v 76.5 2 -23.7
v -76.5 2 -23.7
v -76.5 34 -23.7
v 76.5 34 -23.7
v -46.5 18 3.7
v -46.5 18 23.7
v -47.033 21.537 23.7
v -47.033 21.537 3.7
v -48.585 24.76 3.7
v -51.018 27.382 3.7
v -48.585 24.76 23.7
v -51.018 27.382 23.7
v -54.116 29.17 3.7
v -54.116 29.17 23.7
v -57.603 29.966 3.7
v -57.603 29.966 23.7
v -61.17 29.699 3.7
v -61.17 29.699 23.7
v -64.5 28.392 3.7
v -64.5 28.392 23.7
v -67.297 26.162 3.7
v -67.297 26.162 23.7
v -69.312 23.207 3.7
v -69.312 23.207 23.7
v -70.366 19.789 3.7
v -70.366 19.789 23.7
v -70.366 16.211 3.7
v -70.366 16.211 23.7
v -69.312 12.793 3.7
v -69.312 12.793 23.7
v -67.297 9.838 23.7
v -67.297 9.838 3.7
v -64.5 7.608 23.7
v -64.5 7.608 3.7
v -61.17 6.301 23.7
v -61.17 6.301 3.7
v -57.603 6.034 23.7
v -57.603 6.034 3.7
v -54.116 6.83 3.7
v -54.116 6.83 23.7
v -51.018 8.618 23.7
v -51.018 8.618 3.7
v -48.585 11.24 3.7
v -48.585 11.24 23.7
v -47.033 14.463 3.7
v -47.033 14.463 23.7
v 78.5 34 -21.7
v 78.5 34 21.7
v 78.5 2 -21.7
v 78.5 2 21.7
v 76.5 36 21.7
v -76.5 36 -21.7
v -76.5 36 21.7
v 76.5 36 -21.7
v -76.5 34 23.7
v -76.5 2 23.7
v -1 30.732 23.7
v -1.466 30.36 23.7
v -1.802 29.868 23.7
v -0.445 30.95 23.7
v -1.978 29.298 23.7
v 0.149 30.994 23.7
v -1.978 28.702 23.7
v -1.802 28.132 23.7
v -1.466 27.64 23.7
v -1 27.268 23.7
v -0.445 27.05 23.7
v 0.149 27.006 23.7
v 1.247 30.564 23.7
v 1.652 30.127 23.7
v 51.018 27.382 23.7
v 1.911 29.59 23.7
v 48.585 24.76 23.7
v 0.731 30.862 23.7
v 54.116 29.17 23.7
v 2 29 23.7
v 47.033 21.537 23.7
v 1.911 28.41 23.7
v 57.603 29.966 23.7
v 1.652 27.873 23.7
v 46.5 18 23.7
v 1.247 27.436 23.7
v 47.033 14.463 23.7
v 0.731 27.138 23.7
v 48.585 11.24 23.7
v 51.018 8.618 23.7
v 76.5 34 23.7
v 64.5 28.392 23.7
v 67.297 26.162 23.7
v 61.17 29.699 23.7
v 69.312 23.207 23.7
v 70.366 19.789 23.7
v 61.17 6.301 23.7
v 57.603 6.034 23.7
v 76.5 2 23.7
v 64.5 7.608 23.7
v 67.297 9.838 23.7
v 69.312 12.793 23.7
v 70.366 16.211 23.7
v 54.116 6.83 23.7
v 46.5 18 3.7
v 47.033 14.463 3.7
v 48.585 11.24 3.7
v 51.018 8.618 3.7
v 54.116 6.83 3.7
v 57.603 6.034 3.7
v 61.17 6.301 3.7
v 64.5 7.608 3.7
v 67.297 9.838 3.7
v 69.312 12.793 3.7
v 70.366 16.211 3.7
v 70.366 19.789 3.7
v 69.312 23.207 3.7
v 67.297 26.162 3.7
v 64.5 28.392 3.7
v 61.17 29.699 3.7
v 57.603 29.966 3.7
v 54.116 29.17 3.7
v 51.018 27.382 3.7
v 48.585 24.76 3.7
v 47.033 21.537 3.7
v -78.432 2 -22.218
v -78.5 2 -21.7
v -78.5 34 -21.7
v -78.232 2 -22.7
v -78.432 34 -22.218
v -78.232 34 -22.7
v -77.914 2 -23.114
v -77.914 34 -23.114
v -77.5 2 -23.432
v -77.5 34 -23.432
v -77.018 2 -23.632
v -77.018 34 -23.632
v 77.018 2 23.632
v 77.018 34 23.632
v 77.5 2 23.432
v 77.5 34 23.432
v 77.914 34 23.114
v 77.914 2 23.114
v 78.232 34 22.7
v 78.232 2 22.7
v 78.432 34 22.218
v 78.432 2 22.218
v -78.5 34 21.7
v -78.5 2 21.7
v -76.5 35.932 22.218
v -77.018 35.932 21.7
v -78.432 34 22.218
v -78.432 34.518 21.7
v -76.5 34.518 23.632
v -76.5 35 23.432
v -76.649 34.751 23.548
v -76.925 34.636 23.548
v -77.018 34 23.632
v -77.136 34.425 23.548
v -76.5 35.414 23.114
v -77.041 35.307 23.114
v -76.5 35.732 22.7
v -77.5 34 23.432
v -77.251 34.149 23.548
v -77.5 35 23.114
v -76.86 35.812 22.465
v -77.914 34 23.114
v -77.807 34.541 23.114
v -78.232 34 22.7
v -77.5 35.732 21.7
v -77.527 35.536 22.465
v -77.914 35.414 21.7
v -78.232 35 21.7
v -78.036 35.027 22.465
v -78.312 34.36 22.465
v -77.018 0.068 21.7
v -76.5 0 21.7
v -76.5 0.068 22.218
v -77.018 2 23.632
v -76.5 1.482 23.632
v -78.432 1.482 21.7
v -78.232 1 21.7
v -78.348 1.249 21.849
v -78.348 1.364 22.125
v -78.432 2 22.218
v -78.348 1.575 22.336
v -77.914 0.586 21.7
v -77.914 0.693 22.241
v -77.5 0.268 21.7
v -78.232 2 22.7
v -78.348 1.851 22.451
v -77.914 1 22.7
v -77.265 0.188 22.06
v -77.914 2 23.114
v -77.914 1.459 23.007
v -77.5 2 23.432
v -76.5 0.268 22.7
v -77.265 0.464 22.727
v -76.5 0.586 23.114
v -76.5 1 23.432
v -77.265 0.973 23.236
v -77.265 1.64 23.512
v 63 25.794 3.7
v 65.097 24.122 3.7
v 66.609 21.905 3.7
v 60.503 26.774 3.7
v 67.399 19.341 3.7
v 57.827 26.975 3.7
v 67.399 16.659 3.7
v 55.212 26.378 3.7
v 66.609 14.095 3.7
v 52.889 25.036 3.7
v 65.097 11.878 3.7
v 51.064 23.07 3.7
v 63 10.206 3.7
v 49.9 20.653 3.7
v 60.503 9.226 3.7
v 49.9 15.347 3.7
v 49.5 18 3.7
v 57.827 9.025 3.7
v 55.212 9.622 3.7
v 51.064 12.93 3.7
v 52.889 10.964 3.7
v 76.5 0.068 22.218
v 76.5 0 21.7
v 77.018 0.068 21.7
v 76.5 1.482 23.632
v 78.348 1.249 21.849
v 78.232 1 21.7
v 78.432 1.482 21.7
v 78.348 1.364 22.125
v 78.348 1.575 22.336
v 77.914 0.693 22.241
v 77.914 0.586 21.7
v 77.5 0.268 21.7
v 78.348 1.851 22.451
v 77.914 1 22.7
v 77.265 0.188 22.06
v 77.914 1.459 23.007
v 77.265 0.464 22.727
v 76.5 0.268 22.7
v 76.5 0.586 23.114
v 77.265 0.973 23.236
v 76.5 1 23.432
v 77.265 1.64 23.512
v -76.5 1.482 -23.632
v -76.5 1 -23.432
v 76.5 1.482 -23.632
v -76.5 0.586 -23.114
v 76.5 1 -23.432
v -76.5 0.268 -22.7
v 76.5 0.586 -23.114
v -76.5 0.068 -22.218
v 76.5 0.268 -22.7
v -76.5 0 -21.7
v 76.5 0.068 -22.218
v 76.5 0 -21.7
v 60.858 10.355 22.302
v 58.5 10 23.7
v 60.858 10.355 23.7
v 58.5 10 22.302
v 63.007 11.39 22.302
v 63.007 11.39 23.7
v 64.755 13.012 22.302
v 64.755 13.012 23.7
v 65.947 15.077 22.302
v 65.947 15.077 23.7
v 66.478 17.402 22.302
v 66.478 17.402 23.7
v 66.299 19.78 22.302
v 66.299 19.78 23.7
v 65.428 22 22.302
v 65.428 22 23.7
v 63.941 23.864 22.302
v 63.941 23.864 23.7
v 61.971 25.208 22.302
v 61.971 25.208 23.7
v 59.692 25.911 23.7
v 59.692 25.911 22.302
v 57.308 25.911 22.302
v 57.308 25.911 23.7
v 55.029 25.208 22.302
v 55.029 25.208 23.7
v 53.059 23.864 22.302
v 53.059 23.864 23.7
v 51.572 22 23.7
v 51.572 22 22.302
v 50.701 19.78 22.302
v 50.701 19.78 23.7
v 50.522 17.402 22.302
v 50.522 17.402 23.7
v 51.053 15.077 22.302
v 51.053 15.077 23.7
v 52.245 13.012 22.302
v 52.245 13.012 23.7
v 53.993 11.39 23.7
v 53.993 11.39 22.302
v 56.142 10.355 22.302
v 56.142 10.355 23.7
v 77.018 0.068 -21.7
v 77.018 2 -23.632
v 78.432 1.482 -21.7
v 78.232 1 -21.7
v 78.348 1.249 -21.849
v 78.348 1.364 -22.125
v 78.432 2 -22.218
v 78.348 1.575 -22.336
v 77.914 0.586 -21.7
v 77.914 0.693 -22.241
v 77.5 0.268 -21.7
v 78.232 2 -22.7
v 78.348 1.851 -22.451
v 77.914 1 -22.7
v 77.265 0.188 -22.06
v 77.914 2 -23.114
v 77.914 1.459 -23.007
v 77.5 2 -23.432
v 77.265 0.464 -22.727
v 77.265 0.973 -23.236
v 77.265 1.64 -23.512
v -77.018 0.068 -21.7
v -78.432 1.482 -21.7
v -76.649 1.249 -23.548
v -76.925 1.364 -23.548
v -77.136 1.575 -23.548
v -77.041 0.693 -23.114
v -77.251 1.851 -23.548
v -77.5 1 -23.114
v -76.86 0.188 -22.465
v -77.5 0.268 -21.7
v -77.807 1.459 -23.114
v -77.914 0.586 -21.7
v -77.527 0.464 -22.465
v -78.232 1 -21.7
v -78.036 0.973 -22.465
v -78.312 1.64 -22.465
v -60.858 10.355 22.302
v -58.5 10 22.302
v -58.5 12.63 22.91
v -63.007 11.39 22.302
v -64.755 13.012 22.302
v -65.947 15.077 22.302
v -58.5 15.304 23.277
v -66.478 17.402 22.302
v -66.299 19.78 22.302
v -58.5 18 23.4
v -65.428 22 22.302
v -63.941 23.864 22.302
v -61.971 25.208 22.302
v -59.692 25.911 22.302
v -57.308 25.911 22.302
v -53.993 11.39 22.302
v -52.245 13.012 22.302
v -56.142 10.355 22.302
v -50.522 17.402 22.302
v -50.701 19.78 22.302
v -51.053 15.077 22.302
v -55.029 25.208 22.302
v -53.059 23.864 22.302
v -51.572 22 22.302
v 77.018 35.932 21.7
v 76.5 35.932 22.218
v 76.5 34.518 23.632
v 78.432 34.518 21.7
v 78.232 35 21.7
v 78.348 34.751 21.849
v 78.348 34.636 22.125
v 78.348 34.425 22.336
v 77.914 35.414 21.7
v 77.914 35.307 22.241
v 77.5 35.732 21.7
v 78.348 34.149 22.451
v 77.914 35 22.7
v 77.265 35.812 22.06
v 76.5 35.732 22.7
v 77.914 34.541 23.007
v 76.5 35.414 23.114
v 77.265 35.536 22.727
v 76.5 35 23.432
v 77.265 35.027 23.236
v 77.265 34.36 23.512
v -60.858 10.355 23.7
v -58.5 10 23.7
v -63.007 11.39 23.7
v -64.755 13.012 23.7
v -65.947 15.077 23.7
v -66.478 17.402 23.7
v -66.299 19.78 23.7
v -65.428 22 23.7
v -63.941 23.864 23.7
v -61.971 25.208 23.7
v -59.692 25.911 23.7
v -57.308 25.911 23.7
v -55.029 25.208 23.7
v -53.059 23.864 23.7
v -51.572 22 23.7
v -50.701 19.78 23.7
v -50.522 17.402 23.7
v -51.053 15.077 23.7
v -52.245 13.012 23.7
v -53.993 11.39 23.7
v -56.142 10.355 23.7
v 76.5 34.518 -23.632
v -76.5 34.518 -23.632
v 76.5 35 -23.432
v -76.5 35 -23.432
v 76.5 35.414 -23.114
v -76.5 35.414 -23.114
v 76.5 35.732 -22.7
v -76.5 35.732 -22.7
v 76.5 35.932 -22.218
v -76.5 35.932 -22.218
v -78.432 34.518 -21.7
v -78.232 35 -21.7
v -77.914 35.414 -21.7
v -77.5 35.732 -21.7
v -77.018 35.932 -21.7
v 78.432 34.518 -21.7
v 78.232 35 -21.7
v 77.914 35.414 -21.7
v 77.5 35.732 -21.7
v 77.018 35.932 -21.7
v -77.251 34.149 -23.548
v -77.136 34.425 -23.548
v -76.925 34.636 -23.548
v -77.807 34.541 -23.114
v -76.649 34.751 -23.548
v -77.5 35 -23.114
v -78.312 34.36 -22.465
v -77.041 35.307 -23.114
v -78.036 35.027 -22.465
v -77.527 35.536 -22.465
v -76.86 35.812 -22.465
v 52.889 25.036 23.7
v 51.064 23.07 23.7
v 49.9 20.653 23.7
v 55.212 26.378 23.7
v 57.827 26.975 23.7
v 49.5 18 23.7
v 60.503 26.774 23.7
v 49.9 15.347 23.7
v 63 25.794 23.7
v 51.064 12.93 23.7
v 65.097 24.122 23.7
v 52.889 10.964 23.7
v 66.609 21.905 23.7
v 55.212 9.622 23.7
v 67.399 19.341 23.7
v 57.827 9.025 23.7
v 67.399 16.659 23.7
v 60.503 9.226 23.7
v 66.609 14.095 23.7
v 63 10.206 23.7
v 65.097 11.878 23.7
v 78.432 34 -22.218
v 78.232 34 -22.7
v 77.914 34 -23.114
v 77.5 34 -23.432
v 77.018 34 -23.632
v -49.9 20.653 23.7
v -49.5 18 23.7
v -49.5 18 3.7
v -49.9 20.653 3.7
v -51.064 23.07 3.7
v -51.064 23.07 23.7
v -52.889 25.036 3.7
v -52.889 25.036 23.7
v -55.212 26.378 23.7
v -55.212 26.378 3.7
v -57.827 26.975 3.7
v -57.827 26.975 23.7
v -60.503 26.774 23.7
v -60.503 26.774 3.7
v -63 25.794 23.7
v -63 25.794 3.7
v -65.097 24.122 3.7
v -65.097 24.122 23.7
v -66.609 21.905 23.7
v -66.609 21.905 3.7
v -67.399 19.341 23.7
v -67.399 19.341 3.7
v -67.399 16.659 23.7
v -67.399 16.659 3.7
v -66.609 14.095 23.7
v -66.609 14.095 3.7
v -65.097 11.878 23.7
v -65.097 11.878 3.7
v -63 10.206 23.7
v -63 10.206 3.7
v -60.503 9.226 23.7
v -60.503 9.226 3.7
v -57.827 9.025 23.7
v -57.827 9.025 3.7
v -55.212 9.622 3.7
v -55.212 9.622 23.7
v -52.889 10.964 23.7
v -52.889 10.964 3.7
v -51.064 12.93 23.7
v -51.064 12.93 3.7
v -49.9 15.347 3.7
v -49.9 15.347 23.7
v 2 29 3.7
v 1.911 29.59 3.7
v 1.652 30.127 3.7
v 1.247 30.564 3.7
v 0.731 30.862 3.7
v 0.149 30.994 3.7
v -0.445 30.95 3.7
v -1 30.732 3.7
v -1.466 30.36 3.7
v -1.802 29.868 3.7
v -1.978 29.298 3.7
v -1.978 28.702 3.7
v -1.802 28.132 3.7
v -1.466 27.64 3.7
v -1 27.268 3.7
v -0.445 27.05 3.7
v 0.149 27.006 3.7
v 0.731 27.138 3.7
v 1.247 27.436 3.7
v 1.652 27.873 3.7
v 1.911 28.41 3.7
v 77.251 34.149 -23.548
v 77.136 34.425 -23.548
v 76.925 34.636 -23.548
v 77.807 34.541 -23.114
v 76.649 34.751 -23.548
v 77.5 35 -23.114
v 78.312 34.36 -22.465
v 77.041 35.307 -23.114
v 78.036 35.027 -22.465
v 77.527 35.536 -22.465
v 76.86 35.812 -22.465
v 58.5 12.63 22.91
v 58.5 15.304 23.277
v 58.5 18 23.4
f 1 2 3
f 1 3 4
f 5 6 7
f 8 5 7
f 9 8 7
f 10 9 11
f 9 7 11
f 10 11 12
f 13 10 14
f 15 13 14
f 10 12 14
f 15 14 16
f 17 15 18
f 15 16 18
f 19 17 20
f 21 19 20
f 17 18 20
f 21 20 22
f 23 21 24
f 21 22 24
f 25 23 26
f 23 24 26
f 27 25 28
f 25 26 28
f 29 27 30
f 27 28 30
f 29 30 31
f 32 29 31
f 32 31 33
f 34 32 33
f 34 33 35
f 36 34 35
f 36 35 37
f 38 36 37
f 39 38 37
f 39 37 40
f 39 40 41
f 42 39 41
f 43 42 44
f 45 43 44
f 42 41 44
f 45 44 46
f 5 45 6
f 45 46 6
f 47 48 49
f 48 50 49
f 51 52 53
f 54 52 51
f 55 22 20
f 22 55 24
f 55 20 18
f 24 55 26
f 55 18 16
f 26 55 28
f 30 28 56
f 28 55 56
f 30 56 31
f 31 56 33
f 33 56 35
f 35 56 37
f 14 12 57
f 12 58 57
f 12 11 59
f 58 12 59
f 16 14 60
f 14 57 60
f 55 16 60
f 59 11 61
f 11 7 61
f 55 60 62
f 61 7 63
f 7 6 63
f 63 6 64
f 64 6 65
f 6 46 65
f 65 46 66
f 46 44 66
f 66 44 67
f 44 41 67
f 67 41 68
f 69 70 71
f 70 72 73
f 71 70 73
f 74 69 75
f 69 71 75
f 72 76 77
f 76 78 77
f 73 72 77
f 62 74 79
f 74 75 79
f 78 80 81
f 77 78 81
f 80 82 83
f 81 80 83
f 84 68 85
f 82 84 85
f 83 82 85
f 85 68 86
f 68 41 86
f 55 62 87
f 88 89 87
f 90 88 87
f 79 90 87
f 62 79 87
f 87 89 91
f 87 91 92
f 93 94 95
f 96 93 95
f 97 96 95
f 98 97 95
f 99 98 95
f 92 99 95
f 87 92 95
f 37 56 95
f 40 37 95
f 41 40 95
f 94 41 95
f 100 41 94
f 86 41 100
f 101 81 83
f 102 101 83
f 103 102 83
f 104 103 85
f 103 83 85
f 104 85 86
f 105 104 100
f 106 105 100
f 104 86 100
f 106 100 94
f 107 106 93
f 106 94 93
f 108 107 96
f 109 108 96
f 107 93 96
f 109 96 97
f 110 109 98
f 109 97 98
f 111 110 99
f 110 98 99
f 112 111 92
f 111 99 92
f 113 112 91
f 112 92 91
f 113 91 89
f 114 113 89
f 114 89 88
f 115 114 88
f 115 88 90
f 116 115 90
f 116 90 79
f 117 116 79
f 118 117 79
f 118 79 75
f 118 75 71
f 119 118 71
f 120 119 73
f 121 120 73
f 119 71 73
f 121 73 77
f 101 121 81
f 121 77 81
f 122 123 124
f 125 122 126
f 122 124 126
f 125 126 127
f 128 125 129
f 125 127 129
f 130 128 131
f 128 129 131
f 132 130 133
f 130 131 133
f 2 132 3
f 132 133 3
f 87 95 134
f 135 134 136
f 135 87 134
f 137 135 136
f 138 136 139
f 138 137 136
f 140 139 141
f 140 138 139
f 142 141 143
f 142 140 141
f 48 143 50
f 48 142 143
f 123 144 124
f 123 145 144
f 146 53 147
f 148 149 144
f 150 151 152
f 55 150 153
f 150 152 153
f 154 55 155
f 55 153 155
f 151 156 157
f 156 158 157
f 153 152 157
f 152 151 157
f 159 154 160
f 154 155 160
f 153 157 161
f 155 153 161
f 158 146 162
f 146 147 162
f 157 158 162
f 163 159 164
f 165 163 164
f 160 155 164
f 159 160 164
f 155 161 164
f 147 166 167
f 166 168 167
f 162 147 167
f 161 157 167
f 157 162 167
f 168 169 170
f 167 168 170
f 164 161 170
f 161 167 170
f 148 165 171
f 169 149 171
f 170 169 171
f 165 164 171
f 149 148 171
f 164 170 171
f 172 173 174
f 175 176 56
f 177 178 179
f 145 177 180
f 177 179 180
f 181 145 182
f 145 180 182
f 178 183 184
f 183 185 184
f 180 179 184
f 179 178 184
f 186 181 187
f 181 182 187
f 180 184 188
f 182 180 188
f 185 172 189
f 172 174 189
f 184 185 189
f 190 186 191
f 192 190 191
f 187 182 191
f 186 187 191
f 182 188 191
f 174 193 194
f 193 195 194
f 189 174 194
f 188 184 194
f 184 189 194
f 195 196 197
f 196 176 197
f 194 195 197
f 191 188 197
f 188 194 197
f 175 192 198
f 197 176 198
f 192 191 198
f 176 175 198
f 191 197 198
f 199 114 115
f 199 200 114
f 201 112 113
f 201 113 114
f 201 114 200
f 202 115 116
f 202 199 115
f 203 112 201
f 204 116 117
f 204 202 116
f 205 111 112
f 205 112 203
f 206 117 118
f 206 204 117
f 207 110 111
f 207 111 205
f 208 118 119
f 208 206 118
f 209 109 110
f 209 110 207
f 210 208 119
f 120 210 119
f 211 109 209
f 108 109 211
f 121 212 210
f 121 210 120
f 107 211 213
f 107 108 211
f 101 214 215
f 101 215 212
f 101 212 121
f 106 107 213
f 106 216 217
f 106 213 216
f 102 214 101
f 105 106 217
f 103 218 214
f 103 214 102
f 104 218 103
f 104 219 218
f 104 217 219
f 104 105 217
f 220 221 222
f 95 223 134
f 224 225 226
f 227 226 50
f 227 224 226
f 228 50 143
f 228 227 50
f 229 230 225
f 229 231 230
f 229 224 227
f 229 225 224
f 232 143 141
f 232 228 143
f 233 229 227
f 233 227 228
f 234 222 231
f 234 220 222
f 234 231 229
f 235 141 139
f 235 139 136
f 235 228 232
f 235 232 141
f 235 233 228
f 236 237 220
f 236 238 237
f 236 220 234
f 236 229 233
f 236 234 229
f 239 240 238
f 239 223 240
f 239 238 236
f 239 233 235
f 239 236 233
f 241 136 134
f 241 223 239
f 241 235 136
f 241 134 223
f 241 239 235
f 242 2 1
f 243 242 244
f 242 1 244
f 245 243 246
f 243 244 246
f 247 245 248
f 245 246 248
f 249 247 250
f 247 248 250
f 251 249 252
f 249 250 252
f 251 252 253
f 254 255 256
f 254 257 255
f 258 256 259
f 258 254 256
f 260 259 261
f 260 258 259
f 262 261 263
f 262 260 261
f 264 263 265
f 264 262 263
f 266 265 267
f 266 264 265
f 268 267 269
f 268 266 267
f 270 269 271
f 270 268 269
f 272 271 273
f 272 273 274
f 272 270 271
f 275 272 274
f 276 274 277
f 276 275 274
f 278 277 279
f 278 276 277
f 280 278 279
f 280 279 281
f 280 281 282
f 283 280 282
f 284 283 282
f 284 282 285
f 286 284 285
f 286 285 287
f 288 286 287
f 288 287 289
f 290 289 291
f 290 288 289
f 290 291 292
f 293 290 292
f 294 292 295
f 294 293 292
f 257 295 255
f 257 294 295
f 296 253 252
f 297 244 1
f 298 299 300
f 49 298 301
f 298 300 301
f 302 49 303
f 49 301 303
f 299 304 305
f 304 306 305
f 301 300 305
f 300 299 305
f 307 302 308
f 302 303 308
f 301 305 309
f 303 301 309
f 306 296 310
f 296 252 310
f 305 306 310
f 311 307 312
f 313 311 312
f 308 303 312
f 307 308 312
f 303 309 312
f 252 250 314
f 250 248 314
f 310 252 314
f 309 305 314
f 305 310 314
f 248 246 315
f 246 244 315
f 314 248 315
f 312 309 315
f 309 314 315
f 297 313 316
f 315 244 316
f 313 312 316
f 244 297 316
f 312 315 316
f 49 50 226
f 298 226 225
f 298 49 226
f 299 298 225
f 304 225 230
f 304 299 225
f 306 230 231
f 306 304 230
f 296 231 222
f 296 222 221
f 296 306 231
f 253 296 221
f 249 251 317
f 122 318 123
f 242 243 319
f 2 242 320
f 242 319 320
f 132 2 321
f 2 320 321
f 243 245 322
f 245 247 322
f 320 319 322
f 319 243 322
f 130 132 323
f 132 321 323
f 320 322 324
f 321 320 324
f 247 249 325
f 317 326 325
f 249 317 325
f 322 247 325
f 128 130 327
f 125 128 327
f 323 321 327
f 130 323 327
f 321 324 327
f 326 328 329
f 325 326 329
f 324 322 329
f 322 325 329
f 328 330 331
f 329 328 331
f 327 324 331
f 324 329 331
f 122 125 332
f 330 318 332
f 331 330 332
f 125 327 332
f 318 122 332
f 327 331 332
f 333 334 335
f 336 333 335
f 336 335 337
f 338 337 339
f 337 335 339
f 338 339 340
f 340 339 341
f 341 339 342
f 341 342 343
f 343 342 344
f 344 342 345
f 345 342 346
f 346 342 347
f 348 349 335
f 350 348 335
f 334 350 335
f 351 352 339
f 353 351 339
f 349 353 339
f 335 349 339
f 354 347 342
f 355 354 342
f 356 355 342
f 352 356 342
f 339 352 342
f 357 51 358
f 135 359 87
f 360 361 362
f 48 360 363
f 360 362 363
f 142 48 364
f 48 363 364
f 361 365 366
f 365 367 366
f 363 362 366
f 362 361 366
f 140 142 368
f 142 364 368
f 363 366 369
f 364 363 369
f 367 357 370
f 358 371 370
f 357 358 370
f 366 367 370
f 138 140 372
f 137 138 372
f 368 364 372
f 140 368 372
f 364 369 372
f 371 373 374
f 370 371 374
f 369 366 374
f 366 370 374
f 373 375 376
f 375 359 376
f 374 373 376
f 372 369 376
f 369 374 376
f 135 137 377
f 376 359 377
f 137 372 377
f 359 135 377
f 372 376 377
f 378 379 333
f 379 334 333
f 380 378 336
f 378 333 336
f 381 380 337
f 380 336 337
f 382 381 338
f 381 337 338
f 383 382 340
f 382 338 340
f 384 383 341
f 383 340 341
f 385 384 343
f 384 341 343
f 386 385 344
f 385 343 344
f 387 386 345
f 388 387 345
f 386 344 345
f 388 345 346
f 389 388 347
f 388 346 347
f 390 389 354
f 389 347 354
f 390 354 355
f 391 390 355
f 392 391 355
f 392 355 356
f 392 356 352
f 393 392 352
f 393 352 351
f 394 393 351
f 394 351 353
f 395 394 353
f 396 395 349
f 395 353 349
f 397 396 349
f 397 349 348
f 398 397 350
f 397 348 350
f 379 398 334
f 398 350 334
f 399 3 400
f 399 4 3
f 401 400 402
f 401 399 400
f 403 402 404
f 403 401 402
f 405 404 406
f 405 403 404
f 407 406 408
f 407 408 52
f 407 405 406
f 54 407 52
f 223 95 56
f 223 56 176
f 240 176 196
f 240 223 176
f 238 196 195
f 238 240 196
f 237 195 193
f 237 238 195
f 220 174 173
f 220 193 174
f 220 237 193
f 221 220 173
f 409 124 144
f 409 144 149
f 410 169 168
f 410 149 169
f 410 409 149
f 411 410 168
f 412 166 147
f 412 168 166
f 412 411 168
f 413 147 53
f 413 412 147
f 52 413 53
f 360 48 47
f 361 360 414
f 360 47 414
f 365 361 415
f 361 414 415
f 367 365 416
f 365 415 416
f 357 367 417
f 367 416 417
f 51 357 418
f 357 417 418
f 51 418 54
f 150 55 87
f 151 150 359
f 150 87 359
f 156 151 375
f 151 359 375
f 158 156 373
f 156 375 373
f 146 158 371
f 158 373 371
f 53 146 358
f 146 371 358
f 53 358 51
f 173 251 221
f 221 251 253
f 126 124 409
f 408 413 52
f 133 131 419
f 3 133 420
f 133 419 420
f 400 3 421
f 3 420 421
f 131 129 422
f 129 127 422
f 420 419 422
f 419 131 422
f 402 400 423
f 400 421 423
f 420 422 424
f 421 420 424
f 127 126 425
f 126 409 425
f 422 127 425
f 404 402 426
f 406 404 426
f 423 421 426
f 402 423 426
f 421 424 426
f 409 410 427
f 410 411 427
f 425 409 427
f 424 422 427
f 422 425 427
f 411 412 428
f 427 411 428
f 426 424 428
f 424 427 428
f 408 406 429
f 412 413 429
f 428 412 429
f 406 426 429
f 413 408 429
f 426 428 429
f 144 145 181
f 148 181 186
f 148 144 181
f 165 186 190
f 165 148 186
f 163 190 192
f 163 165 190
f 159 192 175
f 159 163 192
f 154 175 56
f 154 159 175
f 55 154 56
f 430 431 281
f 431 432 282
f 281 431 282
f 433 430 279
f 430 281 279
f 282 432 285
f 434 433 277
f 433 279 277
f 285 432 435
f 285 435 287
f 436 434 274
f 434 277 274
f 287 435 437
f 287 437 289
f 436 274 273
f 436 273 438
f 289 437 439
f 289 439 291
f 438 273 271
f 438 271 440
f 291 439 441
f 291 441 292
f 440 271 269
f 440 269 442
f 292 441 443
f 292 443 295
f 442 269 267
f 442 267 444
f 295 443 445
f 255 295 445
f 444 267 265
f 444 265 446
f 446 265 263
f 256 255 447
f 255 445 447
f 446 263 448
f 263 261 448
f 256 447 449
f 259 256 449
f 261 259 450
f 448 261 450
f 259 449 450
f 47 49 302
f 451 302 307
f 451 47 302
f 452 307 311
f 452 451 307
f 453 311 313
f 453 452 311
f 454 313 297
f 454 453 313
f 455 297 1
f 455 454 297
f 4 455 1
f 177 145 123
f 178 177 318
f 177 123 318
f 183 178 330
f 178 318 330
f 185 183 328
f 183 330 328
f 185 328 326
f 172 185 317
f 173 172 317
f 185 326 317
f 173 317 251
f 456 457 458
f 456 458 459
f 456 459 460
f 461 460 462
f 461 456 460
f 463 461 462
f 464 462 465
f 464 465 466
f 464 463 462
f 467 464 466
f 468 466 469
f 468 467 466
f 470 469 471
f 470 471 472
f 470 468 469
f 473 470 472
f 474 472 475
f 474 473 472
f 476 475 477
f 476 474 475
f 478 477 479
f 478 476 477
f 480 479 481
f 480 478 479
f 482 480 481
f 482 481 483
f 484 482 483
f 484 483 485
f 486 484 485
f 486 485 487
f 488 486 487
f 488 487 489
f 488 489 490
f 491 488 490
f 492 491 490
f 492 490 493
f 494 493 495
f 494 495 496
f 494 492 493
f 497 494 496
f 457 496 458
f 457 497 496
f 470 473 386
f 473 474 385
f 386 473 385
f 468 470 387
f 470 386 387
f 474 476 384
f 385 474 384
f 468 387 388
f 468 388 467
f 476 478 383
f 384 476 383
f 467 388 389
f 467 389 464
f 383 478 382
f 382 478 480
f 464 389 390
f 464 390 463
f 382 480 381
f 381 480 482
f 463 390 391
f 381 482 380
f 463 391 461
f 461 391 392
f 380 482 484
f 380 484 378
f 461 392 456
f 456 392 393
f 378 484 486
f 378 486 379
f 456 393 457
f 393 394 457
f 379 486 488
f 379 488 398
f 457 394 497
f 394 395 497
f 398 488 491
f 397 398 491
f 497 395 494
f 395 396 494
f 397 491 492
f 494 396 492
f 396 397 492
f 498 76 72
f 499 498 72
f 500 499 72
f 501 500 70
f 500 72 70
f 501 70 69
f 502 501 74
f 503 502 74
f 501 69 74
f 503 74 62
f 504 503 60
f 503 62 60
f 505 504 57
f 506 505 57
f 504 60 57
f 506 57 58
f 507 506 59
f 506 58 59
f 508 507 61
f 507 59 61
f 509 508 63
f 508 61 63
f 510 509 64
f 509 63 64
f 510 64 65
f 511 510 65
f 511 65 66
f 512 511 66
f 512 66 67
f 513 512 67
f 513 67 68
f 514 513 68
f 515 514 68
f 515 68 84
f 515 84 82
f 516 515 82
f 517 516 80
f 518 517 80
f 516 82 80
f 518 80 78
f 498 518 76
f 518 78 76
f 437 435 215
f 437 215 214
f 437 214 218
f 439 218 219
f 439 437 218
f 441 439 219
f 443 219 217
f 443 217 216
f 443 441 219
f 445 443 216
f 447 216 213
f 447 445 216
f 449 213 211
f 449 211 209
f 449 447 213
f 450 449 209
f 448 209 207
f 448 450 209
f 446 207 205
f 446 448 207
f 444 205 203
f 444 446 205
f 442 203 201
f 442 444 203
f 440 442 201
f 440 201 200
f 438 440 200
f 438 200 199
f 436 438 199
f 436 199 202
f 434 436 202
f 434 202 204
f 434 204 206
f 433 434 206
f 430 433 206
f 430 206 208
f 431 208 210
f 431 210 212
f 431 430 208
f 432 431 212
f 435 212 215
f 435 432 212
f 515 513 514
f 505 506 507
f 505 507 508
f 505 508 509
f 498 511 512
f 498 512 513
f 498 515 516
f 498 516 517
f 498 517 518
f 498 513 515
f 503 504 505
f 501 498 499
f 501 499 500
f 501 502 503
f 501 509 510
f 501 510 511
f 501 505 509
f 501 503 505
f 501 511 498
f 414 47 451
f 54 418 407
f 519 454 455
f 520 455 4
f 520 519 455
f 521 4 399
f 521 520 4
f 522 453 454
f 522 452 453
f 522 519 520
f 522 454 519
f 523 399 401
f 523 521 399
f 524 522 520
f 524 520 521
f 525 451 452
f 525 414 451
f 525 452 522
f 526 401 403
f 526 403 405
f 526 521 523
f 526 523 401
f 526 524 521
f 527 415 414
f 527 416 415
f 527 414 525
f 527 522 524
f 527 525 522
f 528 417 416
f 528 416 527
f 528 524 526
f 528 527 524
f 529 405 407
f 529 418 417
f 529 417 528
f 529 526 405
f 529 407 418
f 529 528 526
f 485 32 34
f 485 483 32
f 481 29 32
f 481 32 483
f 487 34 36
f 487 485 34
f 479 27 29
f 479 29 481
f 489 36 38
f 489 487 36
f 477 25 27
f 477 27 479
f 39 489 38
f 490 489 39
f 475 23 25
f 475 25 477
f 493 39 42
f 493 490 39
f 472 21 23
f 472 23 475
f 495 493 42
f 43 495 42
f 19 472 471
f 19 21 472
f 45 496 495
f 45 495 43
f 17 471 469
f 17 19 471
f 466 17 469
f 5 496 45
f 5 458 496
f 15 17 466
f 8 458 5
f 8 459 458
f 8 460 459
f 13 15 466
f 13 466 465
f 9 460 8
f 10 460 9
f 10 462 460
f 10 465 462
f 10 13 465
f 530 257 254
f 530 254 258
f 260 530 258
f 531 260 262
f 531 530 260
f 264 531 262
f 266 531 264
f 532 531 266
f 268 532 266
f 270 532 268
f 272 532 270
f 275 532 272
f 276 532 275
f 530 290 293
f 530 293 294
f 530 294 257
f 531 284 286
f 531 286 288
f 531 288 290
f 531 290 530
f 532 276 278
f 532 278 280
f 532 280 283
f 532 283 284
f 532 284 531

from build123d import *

# Parameters (mm, degrees)
SKETCH_1_W          = 157
SKETCH_1_H          = 47.4
EXTRUDE_1_DEPTH     = 36
FILLET_1_R          = 2
SKETCH_2_R          = 2
SKETCH_2_R_2        = 12
SKETCH_2_R_3        = 9
CUT_EXTRUDE_1_DEPTH = 20


with BuildPart() as part:
    # 草图1 → 凸台-拉伸1 (new body)
    with BuildSketch(Plane(origin=(0, 0, 0), x_dir=(1, 0, 0), z_dir=(0, 1, 0))):
        Rectangle(SKETCH_1_W, SKETCH_1_H)
    extrude(amount=EXTRUDE_1_DEPTH)

    # 圆角1
    fillet_1_edges = [part.edges().sort_by_distance(p)[0] for p in [
        (-78.5, 36, 0),
        (0, 36, 23.7),
        (78.5, 36, 0),
        (0, 0, 23.7),
        (-78.5, 0, 0),
        (0, 0, -23.7),
        (78.5, 0, 0),
        (78.5, 18, 23.7),
        (-78.5, 18, 23.7),
        (-78.5, 18, -23.7),
        (78.5, 18, -23.7),
        (0, 36, -23.7),
    ]]
    fillet(fillet_1_edges, radius=FILLET_1_R)

    # 草图2 → 切除-拉伸1 (cut)
    # profile 1 of 3: a face of its own
    with BuildSketch(Plane.XY.offset(23.7)):
        with Locations((0, 29)):
            Circle(SKETCH_2_R)
    # profile 2 of 3: a face of its own
    with BuildSketch(Plane.XY.offset(23.7)):
        with Locations((-58.5, 18)):
            Circle(SKETCH_2_R_2)
        with Locations((-58.5, 18)):
            Circle(SKETCH_2_R_3, mode=Mode.SUBTRACT)
    # profile 3 of 3: a face of its own
    with BuildSketch(Plane.XY.offset(23.7)):
        with Locations(Location((58.5, 18, 0), (0, 0, 180))):
            Circle(SKETCH_2_R_2)
        with Locations(Location((58.5, 18, 0), (0, 0, 180))):
            Circle(SKETCH_2_R_3, mode=Mode.SUBTRACT)
    extrude(amount=-CUT_EXTRUDE_1_DEPTH, mode=Mode.SUBTRACT)

    # 草图4 → 切除-旋转1 (revolve, cut)
    with BuildSketch(Plane(origin=(-58.5, 0, 0), x_dir=(0, -1, 0), z_dir=(-1, 0, 0)), mode=Mode.PRIVATE) as cut_revolve_1_sk:
        with BuildLine():
            Line((-18, 23.7), (-26, 23.7))
            Line((-26, 23.7), (-26, 22.302272637))
            ThreePointArc((-26, 22.302272637), (-22.037480816, 23.124288414), (-18, 23.4))
            Line((-18, 23.4), (-18, 23.7))
        make_face()
    cut_revolve_1 = revolve(cut_revolve_1_sk.sketch.rotate(Axis((-58.5, 18, 23.230858861), (0, 0, -1)), 180), axis=Axis((-58.5, 18, 23.230858861), (0, 0, -1)), mode=Mode.SUBTRACT)

    # 镜向1: 切除-旋转1 across plane
    add(cut_revolve_1.mirror(Plane(origin=(0, 0, 0), x_dir=(0, 0, 1), z_dir=(1, 0, 0))), mode=Mode.SUBTRACT)


solid = part.part
